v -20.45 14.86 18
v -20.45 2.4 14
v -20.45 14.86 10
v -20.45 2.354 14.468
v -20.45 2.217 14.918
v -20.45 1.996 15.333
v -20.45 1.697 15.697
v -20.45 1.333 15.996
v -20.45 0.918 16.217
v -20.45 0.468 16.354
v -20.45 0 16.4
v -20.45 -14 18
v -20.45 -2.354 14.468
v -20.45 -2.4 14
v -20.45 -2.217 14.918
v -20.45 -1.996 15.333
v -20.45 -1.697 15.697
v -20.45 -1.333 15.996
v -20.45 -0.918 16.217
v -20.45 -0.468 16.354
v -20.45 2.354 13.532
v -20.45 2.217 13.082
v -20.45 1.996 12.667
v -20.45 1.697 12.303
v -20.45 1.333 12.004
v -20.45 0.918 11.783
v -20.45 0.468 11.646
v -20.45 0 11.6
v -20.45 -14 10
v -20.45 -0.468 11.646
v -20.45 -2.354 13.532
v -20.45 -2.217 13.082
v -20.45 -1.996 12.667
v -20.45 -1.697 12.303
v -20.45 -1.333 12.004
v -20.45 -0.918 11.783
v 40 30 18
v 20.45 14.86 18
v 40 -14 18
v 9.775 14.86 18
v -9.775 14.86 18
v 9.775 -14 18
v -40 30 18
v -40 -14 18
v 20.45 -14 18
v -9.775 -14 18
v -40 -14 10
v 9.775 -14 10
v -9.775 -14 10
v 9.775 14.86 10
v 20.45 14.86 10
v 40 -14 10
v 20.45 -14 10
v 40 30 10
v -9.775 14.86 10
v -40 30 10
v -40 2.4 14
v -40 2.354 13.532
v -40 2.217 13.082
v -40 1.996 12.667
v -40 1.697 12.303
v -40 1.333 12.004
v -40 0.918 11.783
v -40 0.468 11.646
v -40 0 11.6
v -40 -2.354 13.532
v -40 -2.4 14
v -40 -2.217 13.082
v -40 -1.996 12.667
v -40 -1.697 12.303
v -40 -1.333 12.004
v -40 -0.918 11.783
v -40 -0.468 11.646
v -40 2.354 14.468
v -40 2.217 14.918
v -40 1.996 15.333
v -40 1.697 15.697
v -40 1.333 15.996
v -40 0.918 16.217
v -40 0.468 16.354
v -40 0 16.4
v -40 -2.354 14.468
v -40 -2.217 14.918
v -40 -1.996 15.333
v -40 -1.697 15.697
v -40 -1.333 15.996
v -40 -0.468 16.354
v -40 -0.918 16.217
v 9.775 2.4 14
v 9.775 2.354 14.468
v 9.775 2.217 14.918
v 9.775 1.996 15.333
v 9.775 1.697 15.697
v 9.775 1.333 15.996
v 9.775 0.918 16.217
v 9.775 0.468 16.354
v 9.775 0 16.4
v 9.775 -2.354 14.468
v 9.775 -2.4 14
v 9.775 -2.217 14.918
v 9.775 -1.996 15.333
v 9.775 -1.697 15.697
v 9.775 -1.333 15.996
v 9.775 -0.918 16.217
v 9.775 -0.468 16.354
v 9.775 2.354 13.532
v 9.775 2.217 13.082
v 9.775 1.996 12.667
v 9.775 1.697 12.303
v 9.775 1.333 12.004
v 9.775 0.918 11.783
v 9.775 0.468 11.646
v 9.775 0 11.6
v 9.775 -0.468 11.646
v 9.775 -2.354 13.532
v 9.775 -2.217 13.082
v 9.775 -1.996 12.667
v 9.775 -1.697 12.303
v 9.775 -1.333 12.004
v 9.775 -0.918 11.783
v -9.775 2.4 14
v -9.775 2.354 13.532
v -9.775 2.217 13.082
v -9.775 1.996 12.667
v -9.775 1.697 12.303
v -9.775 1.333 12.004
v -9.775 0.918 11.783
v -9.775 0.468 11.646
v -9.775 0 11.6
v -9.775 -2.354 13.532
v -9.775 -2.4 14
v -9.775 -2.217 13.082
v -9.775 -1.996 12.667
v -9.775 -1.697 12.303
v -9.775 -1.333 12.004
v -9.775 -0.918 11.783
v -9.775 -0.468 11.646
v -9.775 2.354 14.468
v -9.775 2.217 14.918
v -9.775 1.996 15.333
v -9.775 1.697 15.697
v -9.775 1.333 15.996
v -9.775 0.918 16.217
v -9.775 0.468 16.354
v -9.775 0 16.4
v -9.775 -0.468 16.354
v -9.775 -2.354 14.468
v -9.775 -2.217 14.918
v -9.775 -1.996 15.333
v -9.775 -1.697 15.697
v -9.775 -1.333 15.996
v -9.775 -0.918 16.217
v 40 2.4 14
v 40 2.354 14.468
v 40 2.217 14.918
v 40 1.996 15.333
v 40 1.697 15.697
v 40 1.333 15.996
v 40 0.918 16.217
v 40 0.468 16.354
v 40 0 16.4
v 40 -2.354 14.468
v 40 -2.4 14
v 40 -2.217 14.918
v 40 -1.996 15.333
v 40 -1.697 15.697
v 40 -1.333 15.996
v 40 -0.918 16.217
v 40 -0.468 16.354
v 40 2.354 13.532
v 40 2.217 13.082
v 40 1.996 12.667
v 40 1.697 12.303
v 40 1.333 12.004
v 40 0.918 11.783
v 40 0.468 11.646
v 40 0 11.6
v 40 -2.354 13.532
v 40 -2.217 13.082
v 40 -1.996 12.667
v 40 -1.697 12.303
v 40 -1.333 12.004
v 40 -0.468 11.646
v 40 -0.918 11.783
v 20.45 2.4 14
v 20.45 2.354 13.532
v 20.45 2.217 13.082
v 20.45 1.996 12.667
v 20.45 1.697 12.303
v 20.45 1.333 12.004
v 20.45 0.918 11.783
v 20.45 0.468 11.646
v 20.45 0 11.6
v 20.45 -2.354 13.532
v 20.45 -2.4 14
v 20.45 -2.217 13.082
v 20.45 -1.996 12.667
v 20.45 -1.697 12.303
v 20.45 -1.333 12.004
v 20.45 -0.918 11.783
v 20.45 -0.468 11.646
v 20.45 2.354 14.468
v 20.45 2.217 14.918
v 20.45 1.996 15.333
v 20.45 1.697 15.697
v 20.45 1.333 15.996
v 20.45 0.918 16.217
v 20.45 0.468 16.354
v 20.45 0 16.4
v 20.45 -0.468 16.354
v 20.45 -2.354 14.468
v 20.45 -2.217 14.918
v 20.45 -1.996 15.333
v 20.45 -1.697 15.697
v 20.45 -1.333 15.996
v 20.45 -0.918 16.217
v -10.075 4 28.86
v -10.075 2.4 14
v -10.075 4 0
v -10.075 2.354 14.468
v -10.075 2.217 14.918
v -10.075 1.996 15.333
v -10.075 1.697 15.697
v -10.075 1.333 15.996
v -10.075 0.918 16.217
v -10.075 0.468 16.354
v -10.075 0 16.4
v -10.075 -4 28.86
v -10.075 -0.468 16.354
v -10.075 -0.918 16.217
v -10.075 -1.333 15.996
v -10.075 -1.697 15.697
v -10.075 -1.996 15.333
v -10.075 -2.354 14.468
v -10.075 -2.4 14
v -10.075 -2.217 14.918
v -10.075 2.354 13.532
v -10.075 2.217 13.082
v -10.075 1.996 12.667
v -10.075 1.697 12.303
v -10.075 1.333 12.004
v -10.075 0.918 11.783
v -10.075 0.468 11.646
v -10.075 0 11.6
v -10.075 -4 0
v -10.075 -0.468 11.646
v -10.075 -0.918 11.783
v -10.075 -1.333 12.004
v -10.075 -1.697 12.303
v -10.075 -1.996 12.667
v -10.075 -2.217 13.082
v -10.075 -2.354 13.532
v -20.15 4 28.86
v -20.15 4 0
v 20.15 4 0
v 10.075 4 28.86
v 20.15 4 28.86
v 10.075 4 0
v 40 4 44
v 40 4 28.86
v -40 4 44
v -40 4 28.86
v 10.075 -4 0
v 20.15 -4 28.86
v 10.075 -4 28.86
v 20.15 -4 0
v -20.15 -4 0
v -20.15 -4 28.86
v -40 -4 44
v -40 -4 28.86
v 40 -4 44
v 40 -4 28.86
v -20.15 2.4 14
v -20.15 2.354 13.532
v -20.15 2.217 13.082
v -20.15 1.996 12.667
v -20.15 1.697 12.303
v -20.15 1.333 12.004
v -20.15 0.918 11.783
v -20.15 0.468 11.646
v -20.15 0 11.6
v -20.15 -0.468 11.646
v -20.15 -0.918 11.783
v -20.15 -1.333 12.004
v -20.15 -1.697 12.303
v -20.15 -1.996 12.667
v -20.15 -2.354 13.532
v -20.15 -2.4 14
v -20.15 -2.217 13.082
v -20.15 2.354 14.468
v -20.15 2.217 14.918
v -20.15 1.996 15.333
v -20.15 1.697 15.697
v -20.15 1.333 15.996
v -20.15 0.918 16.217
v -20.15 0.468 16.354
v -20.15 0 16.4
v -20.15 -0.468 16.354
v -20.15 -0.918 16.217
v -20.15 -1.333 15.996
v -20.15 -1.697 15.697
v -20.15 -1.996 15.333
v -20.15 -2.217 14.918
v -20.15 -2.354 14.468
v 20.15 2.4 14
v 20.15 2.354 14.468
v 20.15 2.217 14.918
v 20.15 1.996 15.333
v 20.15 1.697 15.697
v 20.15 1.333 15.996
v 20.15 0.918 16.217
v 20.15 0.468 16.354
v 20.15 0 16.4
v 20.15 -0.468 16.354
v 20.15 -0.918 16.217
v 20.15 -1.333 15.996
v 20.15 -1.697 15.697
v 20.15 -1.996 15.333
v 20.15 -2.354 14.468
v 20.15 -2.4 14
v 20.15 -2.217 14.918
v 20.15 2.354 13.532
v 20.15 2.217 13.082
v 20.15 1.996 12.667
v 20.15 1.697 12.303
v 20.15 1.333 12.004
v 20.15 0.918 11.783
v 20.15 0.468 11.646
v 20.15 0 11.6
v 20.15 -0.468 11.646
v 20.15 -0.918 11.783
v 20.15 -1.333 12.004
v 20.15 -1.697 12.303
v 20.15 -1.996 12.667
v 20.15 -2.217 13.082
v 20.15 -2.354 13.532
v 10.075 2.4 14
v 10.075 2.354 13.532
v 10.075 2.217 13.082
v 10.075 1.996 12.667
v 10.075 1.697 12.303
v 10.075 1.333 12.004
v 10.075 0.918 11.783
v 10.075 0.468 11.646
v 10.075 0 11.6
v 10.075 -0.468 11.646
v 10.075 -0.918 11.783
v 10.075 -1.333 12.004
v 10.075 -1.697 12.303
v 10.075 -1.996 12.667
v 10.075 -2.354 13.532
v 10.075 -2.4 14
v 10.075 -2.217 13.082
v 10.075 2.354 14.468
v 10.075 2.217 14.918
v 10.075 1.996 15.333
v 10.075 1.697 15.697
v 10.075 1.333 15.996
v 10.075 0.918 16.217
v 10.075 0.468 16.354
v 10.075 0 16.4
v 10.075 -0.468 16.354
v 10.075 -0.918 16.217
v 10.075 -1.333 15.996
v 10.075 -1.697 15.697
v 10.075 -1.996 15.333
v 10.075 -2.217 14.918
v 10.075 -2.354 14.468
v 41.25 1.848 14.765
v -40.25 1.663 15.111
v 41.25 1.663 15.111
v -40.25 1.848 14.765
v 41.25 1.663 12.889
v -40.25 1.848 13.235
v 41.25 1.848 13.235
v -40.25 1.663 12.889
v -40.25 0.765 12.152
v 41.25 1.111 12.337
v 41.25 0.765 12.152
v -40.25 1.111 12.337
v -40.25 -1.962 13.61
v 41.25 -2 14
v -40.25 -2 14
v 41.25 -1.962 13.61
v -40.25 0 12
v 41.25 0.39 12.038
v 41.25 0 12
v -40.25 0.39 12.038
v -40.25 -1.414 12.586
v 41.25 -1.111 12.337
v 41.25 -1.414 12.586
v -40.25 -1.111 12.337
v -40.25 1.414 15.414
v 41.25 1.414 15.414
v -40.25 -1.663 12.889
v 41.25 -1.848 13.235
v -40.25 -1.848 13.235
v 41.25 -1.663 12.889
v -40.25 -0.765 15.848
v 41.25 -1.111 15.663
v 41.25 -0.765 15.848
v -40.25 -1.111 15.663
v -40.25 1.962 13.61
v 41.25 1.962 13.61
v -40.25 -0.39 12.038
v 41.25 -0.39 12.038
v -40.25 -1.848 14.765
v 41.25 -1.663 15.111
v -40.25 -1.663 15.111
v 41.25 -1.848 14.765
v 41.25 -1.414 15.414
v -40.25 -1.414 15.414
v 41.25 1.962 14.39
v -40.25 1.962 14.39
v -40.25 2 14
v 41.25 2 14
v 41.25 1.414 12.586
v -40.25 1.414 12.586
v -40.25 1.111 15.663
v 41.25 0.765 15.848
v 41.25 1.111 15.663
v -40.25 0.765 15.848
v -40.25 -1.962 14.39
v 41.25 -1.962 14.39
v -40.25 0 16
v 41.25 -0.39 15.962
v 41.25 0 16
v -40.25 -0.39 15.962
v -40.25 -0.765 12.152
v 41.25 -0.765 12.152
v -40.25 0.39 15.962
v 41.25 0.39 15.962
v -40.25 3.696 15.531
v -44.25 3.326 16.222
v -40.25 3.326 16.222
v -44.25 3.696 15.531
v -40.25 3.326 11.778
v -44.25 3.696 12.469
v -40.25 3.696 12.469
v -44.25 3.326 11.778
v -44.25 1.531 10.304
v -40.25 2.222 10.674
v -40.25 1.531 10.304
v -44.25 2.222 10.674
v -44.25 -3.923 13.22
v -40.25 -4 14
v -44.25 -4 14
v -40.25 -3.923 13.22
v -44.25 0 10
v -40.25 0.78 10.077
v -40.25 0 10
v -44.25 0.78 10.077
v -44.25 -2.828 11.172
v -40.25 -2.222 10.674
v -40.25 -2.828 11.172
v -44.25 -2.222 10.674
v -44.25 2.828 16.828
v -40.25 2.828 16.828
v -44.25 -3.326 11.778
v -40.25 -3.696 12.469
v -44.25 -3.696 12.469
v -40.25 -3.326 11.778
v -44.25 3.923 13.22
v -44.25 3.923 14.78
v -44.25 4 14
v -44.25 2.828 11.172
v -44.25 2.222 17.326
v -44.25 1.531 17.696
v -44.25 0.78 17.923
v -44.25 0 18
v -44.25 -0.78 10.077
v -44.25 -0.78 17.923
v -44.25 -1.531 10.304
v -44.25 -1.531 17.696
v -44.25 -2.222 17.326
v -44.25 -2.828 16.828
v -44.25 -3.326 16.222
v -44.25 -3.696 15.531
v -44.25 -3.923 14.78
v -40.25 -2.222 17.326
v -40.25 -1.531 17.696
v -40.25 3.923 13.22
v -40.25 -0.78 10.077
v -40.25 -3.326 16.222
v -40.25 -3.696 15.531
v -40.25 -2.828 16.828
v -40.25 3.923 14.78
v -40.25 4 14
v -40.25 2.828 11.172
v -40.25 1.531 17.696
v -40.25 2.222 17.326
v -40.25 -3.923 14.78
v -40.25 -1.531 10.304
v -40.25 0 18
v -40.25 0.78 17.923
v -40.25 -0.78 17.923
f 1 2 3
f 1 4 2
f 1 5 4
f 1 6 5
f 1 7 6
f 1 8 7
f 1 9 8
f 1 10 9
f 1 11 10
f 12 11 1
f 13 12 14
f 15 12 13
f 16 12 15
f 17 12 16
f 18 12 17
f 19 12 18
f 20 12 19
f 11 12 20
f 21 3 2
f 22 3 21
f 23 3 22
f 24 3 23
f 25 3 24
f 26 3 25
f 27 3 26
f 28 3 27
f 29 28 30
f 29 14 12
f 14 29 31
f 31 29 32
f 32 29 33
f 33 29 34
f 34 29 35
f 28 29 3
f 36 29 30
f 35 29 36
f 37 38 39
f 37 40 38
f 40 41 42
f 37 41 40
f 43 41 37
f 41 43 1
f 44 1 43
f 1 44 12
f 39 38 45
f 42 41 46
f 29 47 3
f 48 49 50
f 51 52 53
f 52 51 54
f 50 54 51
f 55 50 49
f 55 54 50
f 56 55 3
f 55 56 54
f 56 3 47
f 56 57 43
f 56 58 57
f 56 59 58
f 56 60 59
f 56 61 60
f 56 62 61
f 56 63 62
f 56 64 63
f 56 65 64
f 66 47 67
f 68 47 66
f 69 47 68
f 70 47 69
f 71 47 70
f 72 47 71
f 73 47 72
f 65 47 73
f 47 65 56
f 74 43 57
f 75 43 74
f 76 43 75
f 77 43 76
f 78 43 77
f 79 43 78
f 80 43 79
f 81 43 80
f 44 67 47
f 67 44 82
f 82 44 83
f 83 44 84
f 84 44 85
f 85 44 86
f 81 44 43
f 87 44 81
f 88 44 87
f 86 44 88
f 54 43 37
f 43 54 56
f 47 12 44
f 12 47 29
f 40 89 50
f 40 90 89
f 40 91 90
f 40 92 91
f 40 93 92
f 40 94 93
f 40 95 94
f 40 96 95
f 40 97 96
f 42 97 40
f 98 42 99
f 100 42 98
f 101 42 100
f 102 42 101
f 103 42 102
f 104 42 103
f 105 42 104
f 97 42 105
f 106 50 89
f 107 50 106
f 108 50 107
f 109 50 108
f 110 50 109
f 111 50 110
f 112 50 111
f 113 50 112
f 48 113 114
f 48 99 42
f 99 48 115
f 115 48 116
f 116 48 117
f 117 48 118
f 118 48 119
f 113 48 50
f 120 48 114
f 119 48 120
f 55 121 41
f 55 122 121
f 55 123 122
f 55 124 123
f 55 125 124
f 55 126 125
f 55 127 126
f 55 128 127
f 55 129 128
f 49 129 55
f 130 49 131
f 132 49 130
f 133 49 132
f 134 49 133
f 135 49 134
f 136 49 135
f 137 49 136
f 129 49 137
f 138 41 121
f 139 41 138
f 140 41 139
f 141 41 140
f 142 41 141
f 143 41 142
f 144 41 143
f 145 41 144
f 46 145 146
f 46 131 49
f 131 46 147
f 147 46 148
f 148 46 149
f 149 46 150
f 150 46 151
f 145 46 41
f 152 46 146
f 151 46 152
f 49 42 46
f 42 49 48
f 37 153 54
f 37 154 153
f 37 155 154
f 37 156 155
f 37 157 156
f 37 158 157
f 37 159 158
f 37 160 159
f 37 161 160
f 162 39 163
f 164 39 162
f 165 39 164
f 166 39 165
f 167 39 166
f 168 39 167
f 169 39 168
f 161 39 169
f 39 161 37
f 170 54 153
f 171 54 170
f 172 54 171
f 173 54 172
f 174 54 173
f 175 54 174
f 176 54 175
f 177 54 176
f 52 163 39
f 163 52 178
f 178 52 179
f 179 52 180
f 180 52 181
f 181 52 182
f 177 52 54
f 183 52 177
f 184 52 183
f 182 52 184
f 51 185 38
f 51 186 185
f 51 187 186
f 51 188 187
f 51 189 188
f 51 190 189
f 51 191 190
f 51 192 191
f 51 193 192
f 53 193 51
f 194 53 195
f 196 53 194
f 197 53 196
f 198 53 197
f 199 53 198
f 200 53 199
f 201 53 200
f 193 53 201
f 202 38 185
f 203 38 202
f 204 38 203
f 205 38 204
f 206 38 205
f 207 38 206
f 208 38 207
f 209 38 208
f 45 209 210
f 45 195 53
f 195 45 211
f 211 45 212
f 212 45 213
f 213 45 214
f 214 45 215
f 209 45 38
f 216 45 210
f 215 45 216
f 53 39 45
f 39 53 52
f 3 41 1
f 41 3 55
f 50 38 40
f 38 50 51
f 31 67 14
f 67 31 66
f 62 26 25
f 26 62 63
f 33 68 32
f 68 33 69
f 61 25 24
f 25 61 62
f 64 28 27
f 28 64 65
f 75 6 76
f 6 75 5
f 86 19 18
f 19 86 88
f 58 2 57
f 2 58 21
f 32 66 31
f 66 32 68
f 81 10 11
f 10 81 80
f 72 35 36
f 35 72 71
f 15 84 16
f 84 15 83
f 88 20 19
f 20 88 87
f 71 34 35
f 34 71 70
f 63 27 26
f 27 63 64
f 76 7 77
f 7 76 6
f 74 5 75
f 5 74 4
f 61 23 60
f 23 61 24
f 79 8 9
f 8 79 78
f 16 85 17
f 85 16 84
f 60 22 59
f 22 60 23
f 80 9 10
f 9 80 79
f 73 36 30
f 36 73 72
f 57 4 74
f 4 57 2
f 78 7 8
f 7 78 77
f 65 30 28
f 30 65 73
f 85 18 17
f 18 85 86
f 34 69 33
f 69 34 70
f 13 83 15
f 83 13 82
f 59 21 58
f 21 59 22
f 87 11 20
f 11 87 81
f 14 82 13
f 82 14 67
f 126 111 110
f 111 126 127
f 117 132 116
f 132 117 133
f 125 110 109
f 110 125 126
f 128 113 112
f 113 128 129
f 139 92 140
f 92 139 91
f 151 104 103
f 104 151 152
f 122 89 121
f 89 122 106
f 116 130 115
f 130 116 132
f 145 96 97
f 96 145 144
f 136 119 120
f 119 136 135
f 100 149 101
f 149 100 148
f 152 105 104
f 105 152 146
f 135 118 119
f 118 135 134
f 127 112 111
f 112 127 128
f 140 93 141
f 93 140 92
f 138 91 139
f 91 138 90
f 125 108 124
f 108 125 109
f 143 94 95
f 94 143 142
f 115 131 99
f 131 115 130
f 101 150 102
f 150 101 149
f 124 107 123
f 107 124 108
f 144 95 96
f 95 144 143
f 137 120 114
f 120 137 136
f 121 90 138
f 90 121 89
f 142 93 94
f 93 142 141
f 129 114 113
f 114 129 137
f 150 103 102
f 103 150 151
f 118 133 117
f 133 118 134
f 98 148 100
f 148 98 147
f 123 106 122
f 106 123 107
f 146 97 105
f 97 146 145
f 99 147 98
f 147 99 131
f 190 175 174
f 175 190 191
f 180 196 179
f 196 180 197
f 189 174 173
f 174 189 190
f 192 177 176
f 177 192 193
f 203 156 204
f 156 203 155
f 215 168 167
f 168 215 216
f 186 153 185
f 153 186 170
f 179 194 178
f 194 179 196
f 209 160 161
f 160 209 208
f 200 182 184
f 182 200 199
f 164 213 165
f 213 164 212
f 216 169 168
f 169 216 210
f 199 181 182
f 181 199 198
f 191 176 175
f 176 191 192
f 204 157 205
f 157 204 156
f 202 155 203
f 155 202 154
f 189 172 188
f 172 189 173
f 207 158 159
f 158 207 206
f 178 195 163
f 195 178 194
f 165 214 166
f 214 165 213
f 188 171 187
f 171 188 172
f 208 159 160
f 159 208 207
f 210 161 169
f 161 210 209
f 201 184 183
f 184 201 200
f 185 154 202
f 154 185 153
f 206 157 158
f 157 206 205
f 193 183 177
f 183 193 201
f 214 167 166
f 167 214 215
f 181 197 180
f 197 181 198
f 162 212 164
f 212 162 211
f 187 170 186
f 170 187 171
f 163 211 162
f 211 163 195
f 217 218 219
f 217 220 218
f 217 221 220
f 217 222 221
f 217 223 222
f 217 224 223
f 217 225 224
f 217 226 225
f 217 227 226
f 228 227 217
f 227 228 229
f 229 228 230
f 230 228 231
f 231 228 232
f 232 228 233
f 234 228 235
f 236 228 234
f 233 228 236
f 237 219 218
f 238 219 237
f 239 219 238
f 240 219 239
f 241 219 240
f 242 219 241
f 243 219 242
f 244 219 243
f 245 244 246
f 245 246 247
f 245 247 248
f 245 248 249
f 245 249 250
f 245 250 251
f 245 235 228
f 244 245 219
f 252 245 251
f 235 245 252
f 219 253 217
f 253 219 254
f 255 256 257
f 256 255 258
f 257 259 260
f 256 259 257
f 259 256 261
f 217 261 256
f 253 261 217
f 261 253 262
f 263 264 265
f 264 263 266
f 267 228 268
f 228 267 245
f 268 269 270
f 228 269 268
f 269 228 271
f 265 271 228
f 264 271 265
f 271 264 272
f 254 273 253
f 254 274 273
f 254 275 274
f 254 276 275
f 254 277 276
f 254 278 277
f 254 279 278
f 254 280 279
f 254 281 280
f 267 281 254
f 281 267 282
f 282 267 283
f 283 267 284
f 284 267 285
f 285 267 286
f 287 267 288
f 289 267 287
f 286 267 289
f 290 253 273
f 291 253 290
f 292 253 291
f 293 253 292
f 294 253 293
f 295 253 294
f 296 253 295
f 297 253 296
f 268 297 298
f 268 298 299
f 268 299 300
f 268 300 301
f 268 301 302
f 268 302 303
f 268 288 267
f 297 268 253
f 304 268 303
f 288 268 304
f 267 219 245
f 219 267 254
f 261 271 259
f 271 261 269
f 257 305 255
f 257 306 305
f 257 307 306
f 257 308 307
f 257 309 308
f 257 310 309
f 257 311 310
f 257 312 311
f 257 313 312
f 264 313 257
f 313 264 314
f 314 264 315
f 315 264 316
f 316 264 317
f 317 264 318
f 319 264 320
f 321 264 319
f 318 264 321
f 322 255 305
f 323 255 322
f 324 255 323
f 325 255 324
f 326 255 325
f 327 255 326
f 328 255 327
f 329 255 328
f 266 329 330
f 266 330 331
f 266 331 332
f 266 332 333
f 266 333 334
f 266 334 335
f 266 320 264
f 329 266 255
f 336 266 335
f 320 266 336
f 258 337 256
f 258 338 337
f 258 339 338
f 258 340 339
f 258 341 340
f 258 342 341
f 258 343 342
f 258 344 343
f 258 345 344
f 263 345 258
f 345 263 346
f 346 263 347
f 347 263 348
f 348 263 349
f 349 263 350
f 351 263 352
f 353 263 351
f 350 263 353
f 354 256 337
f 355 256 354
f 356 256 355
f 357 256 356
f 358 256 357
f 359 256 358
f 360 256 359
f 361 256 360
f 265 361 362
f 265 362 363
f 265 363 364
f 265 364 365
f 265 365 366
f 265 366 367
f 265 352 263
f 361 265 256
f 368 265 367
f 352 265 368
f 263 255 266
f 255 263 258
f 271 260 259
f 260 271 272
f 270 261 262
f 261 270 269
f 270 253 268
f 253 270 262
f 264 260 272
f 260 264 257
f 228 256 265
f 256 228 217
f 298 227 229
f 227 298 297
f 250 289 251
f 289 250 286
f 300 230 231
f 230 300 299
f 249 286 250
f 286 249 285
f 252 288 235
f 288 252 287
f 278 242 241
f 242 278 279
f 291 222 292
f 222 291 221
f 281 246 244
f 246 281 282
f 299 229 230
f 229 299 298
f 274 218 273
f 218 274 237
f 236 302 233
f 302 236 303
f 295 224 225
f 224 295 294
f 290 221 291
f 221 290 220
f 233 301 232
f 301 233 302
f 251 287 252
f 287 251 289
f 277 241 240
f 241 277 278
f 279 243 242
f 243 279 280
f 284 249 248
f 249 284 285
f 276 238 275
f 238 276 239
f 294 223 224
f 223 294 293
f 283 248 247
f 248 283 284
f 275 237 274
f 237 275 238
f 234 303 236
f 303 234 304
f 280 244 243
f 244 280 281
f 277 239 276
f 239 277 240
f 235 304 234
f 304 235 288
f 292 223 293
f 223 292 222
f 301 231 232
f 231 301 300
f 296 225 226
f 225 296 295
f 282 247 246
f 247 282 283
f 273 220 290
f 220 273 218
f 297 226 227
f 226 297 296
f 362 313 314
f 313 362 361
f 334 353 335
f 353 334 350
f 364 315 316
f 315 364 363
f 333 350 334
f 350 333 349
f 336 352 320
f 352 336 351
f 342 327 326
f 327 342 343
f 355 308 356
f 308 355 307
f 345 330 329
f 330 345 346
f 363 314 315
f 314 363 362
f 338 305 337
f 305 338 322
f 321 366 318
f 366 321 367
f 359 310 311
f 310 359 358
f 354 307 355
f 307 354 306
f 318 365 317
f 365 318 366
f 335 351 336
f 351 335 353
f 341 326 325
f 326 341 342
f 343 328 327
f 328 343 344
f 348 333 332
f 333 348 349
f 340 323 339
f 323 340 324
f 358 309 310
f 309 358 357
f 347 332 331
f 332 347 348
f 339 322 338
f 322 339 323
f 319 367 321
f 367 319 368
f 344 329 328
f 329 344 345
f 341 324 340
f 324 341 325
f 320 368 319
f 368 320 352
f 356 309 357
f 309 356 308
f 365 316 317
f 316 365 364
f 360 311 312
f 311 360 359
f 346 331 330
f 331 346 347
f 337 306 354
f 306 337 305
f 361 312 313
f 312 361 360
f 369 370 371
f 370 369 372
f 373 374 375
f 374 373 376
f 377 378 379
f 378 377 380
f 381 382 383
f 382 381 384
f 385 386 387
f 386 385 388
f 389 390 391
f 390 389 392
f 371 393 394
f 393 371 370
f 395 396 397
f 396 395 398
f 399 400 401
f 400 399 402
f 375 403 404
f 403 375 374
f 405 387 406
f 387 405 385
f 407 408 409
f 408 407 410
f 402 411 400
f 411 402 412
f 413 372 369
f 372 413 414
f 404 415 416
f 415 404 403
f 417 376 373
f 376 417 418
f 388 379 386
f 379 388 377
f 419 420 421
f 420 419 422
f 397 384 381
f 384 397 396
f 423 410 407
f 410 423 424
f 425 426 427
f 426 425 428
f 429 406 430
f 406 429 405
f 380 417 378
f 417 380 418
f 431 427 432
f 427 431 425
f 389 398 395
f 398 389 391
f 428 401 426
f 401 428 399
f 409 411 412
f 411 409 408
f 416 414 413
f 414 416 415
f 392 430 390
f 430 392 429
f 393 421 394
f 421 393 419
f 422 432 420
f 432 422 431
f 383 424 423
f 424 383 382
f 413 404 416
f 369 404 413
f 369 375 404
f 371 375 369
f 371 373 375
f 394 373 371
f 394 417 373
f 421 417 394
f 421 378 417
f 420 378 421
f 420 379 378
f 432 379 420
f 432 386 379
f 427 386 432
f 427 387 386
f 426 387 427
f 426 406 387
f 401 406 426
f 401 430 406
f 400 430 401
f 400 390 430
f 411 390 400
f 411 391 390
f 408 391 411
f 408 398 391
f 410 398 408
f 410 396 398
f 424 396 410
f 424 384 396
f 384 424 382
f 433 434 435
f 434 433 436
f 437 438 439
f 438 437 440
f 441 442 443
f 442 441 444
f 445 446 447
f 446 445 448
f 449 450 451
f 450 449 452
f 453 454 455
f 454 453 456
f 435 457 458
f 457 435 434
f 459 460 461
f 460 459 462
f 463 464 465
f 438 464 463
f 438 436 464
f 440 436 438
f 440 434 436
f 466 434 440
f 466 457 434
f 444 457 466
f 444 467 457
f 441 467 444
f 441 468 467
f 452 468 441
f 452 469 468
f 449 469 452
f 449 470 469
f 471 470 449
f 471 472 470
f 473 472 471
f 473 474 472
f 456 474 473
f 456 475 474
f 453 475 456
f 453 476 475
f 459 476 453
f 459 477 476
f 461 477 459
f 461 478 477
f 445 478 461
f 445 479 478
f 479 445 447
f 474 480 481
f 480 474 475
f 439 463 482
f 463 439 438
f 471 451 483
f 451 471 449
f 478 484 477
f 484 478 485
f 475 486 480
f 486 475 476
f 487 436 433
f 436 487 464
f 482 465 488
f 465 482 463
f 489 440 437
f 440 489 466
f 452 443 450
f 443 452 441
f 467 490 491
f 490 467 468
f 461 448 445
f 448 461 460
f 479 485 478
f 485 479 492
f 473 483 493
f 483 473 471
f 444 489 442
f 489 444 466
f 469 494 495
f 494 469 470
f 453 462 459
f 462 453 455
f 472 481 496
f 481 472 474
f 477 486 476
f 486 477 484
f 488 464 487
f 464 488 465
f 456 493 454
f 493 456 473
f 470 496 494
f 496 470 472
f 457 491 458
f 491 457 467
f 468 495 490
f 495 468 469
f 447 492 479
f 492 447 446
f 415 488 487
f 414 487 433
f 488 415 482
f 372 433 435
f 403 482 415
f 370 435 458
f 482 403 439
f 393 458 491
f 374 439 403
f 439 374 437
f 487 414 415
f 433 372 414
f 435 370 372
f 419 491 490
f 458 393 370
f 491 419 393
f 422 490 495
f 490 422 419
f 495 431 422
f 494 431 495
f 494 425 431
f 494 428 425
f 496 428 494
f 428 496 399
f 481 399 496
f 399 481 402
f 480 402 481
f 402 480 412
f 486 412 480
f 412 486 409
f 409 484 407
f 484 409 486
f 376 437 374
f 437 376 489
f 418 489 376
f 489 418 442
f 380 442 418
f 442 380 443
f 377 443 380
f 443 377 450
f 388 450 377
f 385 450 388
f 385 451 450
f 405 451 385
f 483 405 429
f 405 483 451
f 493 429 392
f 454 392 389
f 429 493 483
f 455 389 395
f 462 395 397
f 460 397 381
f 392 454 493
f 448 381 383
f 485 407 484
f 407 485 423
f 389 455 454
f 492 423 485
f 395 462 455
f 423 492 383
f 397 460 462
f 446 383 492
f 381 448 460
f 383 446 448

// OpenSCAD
$fn = 32;

// ------------------------------------------------------------------------
// Butt hinge: hinge 80 mm, leaf swung 270 deg
// Every part is its own module, assembly() places every instance.
// ------------------------------------------------------------------------

// --- part 1 ---
module hinge_base() {
  difference() {
    union() {
      translate([-40, -14, -4]) cube([19.55, 44, 8]);
      translate([-9.775, -14, -4]) cube([19.55, 44, 8]);
      translate([20.45, -14, -4]) cube([19.55, 44, 8]);
      translate([-40, 14.86, -4]) cube([80, 15.14, 8]);
    }
    translate([-30.225, 0, 0]) rotate([0, 90, 0]) cylinder(h = 21.55, d = 4.8, center = true);
    translate([0, 0, 0]) rotate([0, 90, 0]) cylinder(h = 21.55, d = 4.8, center = true);
    translate([30.225, 0, 0]) rotate([0, 90, 0]) cylinder(h = 21.55, d = 4.8, center = true);
  }
}

// --- part 2 ---
module hinge_mover() {
  difference() {
    union() {
      translate([-20.15, -30, -4]) cube([10.075, 44, 8]);
      translate([10.075, -30, -4]) cube([10.075, 44, 8]);
      translate([-40, -30, -4]) cube([80, 15.14, 8]);
    }
    translate([-15.113, 0, 0]) rotate([0, 90, 0]) cylinder(h = 12.075, d = 4.8, center = true);
    translate([15.113, 0, 0]) rotate([0, 90, 0]) cylinder(h = 12.075, d = 4.8, center = true);
  }
}

// --- part 3 ---
module hinge_pin() {
  rotate([0, 90, 0]) cylinder(h = 82.5, d = 4, center = true);
  translate([-44.25, 0, 0]) rotate([0, 90, 0]) cylinder(h = 4, d = 8);
}

// --- assembly ---
module assembly() {
  color([0.80, 0.24, 0.20]) translate([0, 0, 14]) rotate([0, 0, 0]) hinge_base();
  color([0.20, 0.45, 0.75]) translate([0, 0, 14]) rotate([270, 0, 0]) hinge_mover();
  color([0.25, 0.62, 0.32]) translate([0, 0, 14]) rotate([0, 0, 0]) hinge_pin();
}

assembly();
